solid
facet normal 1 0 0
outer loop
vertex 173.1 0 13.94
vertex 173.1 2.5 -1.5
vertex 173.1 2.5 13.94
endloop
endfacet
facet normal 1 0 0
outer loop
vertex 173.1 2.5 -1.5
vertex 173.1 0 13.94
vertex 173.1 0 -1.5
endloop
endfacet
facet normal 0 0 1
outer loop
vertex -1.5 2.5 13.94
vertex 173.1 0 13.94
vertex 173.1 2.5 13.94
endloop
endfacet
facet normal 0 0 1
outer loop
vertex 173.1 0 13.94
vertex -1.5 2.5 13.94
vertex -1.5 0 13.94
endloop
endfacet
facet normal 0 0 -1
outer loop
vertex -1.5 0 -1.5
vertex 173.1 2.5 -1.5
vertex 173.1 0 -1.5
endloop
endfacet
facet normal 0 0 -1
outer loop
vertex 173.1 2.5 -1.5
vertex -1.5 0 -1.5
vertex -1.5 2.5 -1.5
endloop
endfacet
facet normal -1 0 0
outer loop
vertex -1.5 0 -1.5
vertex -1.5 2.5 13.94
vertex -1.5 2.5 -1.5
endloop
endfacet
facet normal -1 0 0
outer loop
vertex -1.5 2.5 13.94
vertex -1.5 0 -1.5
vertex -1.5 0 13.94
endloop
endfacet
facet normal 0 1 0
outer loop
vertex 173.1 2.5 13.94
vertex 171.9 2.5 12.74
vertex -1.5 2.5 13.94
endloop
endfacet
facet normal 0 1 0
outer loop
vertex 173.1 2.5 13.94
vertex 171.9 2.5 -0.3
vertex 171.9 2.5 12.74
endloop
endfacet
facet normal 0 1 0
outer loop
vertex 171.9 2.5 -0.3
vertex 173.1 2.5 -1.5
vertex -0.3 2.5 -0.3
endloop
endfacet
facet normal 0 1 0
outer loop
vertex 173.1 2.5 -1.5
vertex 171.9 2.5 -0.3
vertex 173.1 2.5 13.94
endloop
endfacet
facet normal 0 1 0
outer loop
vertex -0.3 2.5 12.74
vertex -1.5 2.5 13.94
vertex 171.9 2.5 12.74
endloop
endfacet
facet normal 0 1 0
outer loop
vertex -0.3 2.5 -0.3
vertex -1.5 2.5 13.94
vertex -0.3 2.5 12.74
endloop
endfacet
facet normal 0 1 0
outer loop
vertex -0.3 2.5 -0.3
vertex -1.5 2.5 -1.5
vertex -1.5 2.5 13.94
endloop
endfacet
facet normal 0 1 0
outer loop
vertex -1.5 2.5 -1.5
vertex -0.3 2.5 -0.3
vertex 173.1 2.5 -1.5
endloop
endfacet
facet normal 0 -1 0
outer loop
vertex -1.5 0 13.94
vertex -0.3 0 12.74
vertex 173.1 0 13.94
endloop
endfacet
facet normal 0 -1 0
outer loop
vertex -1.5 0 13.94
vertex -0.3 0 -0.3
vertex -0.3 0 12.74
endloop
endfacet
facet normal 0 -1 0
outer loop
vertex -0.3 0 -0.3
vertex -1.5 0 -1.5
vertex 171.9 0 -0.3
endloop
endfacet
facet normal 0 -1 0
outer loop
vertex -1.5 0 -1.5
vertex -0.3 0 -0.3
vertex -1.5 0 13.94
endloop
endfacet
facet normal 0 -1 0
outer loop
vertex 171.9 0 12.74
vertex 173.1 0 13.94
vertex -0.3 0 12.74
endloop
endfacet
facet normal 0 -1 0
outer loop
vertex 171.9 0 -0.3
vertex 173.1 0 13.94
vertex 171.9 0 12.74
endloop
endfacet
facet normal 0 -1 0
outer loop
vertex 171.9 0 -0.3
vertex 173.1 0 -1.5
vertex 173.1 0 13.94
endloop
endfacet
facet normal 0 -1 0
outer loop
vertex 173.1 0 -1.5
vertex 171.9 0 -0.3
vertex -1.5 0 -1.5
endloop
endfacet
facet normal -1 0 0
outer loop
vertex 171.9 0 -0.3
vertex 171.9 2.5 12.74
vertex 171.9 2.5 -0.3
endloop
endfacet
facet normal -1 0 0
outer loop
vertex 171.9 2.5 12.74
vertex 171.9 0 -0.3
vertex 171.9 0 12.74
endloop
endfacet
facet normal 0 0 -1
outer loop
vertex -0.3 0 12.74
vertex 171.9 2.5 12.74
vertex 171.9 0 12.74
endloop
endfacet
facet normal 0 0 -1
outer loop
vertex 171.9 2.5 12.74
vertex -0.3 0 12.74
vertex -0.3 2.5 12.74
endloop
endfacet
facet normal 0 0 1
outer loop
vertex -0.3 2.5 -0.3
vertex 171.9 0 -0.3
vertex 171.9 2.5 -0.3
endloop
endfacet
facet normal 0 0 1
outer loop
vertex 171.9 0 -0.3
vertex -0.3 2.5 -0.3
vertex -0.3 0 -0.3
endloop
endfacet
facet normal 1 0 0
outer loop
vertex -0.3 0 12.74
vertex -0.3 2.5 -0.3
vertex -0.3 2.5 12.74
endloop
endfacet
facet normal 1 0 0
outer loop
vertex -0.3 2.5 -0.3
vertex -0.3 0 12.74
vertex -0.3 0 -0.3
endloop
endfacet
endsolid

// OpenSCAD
w = 167;
l = 100;
h = 8.7;

tol_w = 0.6;
tol_l = 0.6;
tol_h = 0.24;

lip = 15;

wall = 2;

bottom = 3.5;

v_conn_w = w / 10 + tol_w;
v_conn_h = 1.5;

brace_h = 2.5;

module horizontal_connector() {
    
    difference(){
        cube( [ w + tol_w + 2 * wall, lip + tol_l + wall, h + bottom + tol_h ] );
        
        translate( [ wall, wall, bottom ] )
            cube( [ w + tol_w, lip + tol_l + 1, h + tol_h + 1 ] );
        
        translate( [ ( w + tol_w + 2 * wall - v_conn_w ) / 2, wall, bottom - v_conn_h - tol_h ] )
            cube( [ v_conn_w + tol_w, 100, 100] );
    
        translate( [ w / 5 + wall - v_conn_w / 2, wall, bottom - v_conn_h - tol_h ] )
            cube( [ v_conn_w + tol_w, 100, 100] );

            translate( [ w + tol_w + 2 * wall - wall - w / 5 - v_conn_w / 2, wall, bottom - v_conn_h - tol_h ] )
            cube( [ v_conn_w + tol_w, 100, 100] );
    }

}

module vertical_connector() {
    
    cube( [ v_conn_w - tol_w, 95, v_conn_h - tol_h ] );
    
}

module brace() {
    
    difference(){
    
        cube( [ w + tol_w + 2 * wall + 2 * 1.2 + tol_w, brace_h, h + bottom + tol_h + 2 * 1.2 + tol_w ] );
        
        translate( [ 1.2, -0.5, 1.2 ] )
            cube( [ w + tol_w + 2 * wall + tol_w, brace_h + 1, h + bottom + tol_h + tol_w ] );        
    }
    
}

//horizontal_connector();

//translate( [ ( w + tol_w + 2 * wall - v_conn_w + 2 * tol_w ) / 2, wall + 2.5, bottom - v_conn_h - tol_h ] )
//    vertical_connector();

translate( [ -1.2 - tol_w / 2, 0, -1.2 - tol_w / 2 ] )
    brace();
